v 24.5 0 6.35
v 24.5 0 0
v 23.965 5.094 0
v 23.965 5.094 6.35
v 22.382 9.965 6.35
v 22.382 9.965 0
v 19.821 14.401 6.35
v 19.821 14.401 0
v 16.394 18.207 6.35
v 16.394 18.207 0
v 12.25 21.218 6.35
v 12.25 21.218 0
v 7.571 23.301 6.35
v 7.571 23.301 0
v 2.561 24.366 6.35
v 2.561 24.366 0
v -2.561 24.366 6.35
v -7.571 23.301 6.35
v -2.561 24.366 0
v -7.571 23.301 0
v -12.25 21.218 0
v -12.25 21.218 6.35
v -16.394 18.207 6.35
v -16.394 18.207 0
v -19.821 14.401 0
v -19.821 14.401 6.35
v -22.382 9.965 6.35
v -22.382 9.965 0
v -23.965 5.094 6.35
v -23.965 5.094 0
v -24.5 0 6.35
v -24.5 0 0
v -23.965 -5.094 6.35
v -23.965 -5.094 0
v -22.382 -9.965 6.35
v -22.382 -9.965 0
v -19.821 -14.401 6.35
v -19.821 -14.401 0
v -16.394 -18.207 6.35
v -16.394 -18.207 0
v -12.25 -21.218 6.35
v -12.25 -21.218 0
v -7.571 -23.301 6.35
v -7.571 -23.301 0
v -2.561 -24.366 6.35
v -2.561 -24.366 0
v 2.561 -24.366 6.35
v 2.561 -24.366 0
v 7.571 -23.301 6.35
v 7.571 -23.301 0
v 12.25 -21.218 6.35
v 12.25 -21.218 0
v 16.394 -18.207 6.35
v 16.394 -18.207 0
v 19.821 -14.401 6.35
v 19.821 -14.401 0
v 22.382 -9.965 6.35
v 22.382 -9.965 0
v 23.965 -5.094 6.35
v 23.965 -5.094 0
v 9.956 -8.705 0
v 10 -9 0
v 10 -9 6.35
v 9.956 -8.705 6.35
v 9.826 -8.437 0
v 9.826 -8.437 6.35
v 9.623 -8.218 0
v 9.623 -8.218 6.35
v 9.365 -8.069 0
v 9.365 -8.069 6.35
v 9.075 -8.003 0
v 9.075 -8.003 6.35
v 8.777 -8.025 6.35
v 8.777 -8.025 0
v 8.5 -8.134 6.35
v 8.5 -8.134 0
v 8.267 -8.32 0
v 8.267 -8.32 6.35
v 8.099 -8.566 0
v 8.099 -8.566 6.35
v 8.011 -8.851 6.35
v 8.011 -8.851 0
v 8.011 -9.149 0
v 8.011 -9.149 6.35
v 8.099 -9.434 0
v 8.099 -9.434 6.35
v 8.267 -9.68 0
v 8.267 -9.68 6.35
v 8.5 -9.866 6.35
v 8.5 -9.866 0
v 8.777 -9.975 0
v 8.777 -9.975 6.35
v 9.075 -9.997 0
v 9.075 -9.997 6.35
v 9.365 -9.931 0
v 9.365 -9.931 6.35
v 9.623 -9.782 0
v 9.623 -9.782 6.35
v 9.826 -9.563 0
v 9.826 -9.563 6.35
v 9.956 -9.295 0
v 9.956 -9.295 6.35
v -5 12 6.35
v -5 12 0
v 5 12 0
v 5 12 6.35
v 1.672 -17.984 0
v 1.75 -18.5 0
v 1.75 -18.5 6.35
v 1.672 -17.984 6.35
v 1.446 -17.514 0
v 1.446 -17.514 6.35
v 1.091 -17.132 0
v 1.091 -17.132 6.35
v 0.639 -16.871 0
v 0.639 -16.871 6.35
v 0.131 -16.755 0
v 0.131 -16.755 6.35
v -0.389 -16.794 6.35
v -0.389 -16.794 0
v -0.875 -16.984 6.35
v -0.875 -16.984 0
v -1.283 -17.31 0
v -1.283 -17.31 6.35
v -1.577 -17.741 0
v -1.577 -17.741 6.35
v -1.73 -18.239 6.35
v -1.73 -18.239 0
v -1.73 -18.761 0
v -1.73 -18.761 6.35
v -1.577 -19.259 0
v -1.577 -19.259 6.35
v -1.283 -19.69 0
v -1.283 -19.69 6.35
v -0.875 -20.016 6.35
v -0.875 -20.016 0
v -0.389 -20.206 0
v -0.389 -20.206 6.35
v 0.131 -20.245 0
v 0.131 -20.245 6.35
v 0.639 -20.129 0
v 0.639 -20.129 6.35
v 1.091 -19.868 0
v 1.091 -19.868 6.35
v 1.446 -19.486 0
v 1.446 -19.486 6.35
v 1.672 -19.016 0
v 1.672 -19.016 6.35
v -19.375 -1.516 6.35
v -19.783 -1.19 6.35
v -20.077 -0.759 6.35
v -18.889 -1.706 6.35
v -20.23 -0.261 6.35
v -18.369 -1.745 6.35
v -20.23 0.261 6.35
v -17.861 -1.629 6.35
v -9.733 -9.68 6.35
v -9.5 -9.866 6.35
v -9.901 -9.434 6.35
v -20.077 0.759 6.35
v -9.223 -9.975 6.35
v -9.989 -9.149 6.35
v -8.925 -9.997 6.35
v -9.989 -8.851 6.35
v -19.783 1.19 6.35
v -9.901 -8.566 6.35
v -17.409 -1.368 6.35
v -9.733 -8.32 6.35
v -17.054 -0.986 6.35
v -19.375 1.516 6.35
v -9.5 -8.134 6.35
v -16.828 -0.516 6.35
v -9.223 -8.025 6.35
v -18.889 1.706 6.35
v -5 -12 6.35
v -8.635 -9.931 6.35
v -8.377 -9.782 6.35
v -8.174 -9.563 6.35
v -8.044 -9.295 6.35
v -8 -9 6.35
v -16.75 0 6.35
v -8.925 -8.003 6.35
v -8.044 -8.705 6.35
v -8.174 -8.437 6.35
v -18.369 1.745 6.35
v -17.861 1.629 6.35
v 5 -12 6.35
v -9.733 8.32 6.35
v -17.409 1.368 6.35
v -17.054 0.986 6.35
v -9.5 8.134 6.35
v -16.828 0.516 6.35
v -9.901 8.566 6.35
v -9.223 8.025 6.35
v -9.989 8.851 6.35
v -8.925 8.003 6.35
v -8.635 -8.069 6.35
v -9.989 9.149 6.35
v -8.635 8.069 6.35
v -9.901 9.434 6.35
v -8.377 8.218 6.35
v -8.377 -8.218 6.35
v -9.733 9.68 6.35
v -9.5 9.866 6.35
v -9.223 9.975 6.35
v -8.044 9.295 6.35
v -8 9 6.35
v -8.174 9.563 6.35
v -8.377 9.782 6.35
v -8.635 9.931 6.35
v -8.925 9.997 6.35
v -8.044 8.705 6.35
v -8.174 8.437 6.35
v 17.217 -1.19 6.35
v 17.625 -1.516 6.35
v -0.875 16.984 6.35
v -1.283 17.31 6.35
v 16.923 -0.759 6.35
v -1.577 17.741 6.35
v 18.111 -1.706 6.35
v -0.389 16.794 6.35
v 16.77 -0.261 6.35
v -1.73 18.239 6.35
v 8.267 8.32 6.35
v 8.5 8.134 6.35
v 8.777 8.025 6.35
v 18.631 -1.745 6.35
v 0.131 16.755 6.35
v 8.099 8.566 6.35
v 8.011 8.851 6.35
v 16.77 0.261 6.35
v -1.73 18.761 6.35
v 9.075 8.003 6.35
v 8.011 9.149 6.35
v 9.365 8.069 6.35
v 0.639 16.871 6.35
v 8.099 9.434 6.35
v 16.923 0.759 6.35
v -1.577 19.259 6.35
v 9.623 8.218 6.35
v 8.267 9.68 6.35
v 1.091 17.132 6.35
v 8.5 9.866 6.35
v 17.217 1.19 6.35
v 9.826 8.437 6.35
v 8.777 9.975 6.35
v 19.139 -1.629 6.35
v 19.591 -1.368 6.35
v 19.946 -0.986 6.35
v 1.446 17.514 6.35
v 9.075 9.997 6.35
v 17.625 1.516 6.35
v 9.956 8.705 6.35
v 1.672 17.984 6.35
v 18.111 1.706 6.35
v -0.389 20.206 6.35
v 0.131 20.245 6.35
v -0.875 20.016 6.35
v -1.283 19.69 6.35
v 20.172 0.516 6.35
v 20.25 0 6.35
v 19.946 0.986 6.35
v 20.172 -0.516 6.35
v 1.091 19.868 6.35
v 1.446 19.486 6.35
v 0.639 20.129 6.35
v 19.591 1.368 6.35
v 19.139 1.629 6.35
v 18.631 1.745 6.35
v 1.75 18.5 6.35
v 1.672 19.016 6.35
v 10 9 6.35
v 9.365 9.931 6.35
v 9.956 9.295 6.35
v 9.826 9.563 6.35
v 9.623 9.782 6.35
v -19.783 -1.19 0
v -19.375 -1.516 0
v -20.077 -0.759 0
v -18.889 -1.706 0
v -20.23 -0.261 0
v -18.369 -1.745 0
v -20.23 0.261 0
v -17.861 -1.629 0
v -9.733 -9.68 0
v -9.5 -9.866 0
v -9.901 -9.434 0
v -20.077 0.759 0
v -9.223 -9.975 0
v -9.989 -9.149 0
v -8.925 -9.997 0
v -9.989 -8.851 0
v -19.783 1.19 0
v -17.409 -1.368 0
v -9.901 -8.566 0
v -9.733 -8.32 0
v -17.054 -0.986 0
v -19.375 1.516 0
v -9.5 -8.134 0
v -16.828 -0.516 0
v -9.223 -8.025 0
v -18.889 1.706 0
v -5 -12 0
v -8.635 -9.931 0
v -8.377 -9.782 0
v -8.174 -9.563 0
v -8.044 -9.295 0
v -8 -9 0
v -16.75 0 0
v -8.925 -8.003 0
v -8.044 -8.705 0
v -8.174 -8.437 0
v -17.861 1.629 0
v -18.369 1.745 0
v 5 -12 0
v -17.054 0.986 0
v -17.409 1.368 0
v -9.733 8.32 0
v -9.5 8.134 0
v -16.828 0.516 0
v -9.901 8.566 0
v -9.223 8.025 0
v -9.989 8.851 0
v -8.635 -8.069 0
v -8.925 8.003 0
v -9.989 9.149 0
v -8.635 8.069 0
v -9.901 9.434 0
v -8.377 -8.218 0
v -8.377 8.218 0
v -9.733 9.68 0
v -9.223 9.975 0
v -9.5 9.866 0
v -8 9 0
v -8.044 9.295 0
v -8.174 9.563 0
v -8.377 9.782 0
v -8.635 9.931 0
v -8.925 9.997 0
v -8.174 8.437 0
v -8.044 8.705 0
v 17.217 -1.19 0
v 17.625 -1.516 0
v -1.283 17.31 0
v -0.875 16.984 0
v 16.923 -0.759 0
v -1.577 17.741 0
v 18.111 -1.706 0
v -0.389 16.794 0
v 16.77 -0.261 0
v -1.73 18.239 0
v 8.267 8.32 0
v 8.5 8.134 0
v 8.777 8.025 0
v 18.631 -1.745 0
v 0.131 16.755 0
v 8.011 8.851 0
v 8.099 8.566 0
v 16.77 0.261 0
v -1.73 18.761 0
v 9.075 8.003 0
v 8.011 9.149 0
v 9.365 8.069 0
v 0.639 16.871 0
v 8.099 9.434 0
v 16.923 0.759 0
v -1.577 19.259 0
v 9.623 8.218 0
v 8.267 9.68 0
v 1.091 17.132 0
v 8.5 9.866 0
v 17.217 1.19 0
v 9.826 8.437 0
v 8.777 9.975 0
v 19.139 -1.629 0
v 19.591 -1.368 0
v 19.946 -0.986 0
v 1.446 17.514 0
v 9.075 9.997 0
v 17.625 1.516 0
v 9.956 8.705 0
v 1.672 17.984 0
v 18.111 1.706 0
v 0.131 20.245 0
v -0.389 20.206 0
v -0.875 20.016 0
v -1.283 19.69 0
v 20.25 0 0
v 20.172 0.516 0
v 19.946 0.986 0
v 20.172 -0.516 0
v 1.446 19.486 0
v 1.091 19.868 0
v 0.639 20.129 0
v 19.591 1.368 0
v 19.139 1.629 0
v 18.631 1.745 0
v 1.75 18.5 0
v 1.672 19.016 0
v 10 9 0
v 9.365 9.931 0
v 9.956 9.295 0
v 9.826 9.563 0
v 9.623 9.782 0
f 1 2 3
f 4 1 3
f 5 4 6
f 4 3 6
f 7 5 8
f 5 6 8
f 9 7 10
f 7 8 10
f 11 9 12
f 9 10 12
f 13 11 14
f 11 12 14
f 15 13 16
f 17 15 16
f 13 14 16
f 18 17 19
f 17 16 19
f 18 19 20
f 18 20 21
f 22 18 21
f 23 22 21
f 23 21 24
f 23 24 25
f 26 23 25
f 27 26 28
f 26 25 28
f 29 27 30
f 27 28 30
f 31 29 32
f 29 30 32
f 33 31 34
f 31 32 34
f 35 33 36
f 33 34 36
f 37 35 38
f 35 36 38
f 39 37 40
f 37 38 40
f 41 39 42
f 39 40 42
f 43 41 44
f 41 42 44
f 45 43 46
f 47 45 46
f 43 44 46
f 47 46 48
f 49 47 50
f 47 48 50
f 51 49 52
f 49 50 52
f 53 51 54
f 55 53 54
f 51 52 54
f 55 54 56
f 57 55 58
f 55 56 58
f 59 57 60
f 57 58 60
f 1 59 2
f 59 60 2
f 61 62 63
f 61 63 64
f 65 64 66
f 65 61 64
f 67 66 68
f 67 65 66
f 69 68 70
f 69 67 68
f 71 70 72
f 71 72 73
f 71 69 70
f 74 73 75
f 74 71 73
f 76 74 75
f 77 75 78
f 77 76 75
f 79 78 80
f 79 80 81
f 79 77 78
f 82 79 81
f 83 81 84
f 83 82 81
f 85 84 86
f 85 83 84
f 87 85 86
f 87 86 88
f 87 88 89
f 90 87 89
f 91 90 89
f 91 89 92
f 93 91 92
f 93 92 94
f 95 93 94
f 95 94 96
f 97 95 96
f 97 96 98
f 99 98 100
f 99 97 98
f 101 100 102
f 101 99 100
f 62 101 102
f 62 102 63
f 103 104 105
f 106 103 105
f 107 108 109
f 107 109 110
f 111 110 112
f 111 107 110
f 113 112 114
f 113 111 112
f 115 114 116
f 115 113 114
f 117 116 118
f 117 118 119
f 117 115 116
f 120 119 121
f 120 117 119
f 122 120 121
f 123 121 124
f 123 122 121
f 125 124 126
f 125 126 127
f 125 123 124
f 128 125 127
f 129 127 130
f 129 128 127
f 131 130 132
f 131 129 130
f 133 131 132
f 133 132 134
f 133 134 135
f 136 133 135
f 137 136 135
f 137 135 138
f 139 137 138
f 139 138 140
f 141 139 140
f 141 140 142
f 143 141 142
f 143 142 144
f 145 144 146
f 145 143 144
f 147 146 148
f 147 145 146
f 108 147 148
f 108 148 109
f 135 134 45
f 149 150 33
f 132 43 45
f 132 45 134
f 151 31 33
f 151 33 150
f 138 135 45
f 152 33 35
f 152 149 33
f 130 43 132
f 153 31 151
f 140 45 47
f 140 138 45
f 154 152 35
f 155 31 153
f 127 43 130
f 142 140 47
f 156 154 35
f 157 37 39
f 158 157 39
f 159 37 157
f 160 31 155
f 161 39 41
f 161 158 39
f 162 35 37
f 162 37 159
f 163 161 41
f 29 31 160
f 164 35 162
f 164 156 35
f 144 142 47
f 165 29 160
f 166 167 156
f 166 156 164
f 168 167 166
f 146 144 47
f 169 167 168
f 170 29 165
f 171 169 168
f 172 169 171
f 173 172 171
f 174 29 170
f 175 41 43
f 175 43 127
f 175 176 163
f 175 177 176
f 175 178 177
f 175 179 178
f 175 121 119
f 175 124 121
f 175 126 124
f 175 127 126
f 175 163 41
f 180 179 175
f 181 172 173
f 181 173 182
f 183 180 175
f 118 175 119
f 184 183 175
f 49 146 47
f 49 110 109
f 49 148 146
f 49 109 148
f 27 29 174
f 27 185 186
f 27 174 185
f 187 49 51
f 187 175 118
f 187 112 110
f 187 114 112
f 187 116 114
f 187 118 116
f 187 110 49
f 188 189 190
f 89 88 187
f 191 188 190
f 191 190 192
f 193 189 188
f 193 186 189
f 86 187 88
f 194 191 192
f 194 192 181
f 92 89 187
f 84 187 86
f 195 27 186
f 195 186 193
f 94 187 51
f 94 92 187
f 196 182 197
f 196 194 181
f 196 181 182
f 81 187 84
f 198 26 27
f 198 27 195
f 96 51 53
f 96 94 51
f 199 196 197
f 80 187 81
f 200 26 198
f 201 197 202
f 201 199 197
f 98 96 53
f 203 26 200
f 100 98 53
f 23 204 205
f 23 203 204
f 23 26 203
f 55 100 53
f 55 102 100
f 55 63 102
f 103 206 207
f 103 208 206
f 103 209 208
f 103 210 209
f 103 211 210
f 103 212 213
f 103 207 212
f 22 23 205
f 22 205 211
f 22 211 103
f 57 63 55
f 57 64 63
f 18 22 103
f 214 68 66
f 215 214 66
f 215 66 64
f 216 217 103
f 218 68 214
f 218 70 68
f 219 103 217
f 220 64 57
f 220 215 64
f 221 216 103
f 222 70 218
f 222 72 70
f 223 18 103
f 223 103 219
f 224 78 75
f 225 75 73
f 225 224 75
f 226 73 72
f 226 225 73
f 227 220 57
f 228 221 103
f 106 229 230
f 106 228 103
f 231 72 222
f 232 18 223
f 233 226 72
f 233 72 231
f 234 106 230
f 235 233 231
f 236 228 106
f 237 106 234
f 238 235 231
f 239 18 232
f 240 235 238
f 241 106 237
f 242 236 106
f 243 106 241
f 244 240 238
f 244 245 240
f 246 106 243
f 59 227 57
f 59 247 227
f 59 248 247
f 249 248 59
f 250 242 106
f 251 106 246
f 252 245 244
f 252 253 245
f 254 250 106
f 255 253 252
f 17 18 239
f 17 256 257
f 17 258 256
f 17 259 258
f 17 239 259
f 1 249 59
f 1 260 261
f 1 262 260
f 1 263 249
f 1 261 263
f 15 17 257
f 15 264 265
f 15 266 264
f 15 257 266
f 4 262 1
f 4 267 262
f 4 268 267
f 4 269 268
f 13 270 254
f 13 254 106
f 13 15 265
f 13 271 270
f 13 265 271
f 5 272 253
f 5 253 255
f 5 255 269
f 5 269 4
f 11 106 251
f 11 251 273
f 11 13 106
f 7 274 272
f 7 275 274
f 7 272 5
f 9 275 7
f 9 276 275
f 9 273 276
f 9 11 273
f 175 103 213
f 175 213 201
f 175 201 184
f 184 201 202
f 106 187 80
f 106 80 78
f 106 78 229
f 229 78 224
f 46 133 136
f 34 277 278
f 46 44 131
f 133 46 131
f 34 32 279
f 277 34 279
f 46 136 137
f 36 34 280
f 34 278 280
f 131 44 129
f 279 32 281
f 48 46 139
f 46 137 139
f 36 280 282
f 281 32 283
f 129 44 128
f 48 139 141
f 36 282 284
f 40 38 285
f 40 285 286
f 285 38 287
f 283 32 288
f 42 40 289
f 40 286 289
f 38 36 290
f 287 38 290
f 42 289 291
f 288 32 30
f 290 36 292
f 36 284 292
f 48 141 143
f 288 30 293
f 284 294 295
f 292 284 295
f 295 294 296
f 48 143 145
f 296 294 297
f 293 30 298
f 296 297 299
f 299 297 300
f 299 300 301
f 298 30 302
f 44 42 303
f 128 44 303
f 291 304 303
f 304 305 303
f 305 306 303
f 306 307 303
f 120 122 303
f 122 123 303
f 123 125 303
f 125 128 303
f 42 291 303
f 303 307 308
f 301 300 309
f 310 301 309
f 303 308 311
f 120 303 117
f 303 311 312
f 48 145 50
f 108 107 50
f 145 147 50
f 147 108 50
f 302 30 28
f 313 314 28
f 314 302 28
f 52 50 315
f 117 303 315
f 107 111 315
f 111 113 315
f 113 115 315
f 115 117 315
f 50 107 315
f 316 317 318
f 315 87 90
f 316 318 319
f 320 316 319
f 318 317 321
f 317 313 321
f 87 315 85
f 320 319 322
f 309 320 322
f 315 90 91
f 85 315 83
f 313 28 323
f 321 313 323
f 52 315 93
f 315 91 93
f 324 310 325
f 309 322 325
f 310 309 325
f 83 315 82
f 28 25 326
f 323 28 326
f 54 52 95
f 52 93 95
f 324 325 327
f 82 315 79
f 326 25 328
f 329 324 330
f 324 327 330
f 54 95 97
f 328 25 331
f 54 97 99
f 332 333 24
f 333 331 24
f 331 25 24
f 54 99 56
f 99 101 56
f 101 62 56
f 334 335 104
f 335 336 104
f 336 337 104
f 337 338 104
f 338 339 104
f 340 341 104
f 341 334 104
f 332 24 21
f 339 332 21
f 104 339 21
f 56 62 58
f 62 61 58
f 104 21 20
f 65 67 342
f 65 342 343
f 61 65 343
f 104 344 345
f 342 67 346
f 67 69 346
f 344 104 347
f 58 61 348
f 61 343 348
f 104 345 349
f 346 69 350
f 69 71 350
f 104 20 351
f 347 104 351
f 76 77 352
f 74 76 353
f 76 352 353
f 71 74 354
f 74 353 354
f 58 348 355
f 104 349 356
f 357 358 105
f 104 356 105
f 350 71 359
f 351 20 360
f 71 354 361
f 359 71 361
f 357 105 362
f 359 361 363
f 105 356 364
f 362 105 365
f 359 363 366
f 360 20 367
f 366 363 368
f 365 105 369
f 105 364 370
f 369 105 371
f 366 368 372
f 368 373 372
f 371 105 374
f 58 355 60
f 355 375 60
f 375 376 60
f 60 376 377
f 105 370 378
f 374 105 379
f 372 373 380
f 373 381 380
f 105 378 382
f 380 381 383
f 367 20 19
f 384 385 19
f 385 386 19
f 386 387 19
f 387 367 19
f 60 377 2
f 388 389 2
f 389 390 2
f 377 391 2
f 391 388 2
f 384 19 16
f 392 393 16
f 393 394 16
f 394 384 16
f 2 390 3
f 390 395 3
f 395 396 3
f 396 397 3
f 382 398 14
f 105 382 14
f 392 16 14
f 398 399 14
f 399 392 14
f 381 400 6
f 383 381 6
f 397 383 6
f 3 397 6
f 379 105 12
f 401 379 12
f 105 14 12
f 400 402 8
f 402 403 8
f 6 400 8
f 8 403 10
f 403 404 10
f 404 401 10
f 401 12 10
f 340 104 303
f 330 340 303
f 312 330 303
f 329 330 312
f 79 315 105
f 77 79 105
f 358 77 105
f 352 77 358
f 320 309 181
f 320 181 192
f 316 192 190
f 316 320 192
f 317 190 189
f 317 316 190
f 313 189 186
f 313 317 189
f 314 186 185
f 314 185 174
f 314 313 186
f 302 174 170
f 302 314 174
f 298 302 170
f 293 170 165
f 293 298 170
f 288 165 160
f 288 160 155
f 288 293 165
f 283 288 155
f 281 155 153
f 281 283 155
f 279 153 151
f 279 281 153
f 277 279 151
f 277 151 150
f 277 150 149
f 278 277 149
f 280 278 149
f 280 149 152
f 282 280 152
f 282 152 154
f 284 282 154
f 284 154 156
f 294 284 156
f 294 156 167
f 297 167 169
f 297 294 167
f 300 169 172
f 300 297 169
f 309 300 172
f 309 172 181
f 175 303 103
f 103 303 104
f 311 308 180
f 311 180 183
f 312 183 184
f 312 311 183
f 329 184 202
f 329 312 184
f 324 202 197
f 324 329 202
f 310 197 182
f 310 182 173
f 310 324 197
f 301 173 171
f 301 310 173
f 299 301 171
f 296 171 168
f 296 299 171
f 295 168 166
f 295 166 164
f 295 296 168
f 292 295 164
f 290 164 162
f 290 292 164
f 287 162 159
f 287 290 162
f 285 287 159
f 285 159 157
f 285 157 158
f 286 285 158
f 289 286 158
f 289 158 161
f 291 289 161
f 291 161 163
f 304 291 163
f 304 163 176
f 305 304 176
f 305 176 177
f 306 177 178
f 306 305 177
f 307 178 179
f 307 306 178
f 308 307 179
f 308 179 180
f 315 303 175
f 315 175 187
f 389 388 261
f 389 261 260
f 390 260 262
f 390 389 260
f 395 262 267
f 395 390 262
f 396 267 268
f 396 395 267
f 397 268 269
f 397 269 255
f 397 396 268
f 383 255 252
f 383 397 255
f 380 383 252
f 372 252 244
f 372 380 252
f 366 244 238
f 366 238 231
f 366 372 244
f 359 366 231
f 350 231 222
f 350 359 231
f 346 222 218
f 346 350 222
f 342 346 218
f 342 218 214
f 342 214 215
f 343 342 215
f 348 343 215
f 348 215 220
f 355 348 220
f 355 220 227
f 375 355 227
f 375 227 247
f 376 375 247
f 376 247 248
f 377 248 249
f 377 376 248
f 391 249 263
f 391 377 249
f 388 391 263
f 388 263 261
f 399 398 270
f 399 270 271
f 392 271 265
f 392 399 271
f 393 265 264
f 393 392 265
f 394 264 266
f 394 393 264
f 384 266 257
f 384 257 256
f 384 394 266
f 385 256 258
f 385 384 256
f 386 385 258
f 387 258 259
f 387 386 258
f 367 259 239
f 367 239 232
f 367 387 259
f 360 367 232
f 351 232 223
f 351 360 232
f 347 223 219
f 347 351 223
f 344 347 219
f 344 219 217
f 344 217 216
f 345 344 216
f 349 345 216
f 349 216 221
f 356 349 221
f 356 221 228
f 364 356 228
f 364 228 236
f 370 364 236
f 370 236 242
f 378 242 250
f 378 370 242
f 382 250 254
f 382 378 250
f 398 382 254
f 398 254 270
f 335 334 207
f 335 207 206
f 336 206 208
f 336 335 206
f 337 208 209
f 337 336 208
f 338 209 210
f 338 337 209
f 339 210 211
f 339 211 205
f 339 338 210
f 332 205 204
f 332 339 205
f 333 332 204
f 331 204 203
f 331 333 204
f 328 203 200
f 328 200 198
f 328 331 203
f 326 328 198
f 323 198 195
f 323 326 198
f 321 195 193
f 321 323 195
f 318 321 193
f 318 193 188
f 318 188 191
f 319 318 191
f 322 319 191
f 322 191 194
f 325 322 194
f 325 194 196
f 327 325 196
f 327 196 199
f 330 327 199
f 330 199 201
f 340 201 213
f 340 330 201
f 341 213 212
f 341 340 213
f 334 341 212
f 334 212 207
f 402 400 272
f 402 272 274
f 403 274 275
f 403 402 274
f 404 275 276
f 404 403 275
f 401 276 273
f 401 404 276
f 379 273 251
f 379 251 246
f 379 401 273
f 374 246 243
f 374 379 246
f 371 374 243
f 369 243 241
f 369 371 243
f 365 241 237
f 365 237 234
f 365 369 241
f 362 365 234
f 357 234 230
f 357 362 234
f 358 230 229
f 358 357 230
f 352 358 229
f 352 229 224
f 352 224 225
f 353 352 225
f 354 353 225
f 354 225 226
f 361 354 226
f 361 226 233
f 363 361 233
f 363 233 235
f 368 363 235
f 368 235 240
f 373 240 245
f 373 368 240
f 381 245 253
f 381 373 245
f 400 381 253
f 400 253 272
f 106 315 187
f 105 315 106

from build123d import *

# Parameters (mm, degrees)
F0_R     = 24.5
F0_R_2   = 1.75
F0_R_3   = 1
F0_W     = 10
F0_H     = 24
F1_DEPTH = 6.35


with BuildPart() as f1:
    # F0 (on Top) → F1 (new body)
    with BuildSketch(Plane.XY):
        Circle(F0_R)
        with Locations((0, -18.5)):
            Circle(F0_R_2, mode=Mode.SUBTRACT)
        with Locations((-18.5, 0)):
            Circle(F0_R_2, mode=Mode.SUBTRACT)
        with Locations((-9, -9)):
            Circle(F0_R_3, mode=Mode.SUBTRACT)
        Rectangle(F0_W, F0_H, mode=Mode.SUBTRACT)
        with Locations((9, -9)):
            Circle(F0_R_3, mode=Mode.SUBTRACT)
        with Locations((18.5, 0)):
            Circle(F0_R_2, mode=Mode.SUBTRACT)
        with Locations((-9, 9)):
            Circle(F0_R_3, mode=Mode.SUBTRACT)
        with Locations((0, 18.5)):
            Circle(F0_R_2, mode=Mode.SUBTRACT)
        with Locations((9, 9)):
            Circle(F0_R_3, mode=Mode.SUBTRACT)
    extrude(amount=F1_DEPTH)


solid = f1.part
